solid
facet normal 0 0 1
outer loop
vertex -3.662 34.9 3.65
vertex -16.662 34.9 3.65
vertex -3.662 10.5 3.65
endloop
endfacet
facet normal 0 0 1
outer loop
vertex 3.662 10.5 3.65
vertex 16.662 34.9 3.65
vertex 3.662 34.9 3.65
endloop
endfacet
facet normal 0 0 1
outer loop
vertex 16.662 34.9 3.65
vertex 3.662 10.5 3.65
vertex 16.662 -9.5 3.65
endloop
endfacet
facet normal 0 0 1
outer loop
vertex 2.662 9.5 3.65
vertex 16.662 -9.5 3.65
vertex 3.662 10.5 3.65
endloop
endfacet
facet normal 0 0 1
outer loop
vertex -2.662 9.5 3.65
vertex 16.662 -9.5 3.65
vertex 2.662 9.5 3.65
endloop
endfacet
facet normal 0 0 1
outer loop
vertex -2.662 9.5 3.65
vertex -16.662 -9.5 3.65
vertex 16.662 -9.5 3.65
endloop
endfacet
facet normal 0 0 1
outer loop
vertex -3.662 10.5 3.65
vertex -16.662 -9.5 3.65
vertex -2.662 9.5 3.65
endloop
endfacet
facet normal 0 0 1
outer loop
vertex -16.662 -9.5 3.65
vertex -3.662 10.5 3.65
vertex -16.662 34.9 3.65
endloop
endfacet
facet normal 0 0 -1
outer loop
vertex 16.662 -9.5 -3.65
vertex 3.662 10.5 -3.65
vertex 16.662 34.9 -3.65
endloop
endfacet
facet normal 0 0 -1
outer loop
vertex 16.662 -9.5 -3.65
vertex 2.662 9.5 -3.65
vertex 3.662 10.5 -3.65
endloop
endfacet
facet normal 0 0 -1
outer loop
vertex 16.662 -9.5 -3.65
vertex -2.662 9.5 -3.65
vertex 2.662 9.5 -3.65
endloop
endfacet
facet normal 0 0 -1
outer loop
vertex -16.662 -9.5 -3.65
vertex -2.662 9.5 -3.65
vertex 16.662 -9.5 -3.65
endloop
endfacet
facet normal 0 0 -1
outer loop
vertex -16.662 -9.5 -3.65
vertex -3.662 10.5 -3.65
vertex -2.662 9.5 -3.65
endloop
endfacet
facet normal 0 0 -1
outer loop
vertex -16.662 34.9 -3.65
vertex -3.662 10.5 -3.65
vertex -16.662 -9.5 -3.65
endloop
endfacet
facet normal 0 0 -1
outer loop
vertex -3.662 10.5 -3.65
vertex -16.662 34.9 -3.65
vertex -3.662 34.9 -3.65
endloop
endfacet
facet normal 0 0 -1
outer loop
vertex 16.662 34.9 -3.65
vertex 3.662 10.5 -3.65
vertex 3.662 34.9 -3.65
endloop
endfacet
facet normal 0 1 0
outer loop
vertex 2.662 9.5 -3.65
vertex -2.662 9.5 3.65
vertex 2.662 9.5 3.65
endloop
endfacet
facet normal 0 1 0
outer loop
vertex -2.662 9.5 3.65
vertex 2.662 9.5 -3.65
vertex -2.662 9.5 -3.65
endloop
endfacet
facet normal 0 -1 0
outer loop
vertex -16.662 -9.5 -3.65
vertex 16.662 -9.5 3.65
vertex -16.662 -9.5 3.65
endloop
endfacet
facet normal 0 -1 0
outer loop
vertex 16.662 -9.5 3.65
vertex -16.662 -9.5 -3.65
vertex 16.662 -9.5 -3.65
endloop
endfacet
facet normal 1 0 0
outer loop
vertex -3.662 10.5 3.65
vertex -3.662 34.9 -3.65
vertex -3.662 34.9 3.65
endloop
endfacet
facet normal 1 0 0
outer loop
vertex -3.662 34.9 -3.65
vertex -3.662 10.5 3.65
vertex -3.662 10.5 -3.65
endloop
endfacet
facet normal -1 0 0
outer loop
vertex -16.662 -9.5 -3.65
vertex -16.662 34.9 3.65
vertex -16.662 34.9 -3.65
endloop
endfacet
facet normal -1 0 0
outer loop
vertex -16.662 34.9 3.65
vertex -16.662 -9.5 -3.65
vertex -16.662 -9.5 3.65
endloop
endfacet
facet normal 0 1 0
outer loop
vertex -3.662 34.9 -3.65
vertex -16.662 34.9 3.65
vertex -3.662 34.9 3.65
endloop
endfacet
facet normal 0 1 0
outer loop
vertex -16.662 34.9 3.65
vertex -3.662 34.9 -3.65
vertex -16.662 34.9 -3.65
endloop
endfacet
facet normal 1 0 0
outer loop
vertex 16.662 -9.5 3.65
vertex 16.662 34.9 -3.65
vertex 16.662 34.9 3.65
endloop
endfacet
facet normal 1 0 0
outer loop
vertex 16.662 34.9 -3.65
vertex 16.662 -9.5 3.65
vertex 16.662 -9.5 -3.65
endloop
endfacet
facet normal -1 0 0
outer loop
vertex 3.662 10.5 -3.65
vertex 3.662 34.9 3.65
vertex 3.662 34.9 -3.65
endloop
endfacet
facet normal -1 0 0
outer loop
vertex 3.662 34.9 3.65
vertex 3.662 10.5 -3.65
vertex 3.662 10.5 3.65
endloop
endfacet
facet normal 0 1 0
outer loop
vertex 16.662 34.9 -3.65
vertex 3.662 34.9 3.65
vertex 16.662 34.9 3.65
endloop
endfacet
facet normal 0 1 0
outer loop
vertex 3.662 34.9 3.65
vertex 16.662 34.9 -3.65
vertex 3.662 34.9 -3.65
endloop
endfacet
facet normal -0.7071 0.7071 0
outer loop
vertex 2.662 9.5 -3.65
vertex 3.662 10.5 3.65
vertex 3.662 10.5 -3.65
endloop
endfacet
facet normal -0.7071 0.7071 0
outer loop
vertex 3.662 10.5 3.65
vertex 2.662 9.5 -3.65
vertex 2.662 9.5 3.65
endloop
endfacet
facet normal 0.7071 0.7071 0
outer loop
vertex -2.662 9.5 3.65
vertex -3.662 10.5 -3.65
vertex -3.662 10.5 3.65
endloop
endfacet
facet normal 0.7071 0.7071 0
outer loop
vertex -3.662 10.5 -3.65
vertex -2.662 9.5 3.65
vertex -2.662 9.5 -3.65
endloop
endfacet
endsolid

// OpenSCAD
// This thing allows you to create NAROD connectors for Gray Hoverman Antennas built
// using aluminum window screen framesq
//
// This is licensed under the creative commons+attribution licence
// To fulfil the attribution requirement, please link to:
//              http://www.thingiverse.com/thing:2160227

/* [Main] */


// size of gap in mm
gap=7.325;

// width of leg in mm
leg_width=13.0;

// thickness of part in mm
thickness=7.3;

// length of leg in mm
leg_length=25.4;

// length of base in mm
base_length=19.0;

// bevel size in mm
width=1.0;

module end(bevel,width,depth,thickness)
{
	translate([0,-width/2,0]) cube([depth-bevel,width,thickness]);
	translate([depth-bevel/2,0,thickness/2]) rotate([0,-90,0]) frustum(thickness,width,thickness-bevel*2,width-bevel*2,bevel);
}

module prism(l, w, h)
{
       polyhedron(
               points=[[0,0,0], [l,0,0], [l,w,0], [0,w,0], [0,w,h], [l,w,h]],
               faces=[[0,1,2,3],[5,4,3,2],[0,4,5,1],[0,3,4],[5,2,1]]
               );
}


module drawConnector()
{
	union()
	{
		cube([gap + 1,base_length,thickness],center = true);
		translate([-(gap/2 + (leg_width/2)),leg_length/2,0]) cube([leg_width,base_length + leg_length,thickness],center = true);
		translate([+(gap/2 + (leg_width/2)),leg_length/2,0]) cube([leg_width,base_length + leg_length,thickness],center = true);

		// add trianglar fillets
		translate([+gap/2,base_length/2 + width,thickness/2]) rotate([0,90,180]) prism(thickness,width,width,center=true);
		translate([-gap/2 + width,base_length/2,thickness/2]) rotate([0,90,90]) prism(thickness,width,width,center=true);
	}
}

$fn=0;

drawConnector();
